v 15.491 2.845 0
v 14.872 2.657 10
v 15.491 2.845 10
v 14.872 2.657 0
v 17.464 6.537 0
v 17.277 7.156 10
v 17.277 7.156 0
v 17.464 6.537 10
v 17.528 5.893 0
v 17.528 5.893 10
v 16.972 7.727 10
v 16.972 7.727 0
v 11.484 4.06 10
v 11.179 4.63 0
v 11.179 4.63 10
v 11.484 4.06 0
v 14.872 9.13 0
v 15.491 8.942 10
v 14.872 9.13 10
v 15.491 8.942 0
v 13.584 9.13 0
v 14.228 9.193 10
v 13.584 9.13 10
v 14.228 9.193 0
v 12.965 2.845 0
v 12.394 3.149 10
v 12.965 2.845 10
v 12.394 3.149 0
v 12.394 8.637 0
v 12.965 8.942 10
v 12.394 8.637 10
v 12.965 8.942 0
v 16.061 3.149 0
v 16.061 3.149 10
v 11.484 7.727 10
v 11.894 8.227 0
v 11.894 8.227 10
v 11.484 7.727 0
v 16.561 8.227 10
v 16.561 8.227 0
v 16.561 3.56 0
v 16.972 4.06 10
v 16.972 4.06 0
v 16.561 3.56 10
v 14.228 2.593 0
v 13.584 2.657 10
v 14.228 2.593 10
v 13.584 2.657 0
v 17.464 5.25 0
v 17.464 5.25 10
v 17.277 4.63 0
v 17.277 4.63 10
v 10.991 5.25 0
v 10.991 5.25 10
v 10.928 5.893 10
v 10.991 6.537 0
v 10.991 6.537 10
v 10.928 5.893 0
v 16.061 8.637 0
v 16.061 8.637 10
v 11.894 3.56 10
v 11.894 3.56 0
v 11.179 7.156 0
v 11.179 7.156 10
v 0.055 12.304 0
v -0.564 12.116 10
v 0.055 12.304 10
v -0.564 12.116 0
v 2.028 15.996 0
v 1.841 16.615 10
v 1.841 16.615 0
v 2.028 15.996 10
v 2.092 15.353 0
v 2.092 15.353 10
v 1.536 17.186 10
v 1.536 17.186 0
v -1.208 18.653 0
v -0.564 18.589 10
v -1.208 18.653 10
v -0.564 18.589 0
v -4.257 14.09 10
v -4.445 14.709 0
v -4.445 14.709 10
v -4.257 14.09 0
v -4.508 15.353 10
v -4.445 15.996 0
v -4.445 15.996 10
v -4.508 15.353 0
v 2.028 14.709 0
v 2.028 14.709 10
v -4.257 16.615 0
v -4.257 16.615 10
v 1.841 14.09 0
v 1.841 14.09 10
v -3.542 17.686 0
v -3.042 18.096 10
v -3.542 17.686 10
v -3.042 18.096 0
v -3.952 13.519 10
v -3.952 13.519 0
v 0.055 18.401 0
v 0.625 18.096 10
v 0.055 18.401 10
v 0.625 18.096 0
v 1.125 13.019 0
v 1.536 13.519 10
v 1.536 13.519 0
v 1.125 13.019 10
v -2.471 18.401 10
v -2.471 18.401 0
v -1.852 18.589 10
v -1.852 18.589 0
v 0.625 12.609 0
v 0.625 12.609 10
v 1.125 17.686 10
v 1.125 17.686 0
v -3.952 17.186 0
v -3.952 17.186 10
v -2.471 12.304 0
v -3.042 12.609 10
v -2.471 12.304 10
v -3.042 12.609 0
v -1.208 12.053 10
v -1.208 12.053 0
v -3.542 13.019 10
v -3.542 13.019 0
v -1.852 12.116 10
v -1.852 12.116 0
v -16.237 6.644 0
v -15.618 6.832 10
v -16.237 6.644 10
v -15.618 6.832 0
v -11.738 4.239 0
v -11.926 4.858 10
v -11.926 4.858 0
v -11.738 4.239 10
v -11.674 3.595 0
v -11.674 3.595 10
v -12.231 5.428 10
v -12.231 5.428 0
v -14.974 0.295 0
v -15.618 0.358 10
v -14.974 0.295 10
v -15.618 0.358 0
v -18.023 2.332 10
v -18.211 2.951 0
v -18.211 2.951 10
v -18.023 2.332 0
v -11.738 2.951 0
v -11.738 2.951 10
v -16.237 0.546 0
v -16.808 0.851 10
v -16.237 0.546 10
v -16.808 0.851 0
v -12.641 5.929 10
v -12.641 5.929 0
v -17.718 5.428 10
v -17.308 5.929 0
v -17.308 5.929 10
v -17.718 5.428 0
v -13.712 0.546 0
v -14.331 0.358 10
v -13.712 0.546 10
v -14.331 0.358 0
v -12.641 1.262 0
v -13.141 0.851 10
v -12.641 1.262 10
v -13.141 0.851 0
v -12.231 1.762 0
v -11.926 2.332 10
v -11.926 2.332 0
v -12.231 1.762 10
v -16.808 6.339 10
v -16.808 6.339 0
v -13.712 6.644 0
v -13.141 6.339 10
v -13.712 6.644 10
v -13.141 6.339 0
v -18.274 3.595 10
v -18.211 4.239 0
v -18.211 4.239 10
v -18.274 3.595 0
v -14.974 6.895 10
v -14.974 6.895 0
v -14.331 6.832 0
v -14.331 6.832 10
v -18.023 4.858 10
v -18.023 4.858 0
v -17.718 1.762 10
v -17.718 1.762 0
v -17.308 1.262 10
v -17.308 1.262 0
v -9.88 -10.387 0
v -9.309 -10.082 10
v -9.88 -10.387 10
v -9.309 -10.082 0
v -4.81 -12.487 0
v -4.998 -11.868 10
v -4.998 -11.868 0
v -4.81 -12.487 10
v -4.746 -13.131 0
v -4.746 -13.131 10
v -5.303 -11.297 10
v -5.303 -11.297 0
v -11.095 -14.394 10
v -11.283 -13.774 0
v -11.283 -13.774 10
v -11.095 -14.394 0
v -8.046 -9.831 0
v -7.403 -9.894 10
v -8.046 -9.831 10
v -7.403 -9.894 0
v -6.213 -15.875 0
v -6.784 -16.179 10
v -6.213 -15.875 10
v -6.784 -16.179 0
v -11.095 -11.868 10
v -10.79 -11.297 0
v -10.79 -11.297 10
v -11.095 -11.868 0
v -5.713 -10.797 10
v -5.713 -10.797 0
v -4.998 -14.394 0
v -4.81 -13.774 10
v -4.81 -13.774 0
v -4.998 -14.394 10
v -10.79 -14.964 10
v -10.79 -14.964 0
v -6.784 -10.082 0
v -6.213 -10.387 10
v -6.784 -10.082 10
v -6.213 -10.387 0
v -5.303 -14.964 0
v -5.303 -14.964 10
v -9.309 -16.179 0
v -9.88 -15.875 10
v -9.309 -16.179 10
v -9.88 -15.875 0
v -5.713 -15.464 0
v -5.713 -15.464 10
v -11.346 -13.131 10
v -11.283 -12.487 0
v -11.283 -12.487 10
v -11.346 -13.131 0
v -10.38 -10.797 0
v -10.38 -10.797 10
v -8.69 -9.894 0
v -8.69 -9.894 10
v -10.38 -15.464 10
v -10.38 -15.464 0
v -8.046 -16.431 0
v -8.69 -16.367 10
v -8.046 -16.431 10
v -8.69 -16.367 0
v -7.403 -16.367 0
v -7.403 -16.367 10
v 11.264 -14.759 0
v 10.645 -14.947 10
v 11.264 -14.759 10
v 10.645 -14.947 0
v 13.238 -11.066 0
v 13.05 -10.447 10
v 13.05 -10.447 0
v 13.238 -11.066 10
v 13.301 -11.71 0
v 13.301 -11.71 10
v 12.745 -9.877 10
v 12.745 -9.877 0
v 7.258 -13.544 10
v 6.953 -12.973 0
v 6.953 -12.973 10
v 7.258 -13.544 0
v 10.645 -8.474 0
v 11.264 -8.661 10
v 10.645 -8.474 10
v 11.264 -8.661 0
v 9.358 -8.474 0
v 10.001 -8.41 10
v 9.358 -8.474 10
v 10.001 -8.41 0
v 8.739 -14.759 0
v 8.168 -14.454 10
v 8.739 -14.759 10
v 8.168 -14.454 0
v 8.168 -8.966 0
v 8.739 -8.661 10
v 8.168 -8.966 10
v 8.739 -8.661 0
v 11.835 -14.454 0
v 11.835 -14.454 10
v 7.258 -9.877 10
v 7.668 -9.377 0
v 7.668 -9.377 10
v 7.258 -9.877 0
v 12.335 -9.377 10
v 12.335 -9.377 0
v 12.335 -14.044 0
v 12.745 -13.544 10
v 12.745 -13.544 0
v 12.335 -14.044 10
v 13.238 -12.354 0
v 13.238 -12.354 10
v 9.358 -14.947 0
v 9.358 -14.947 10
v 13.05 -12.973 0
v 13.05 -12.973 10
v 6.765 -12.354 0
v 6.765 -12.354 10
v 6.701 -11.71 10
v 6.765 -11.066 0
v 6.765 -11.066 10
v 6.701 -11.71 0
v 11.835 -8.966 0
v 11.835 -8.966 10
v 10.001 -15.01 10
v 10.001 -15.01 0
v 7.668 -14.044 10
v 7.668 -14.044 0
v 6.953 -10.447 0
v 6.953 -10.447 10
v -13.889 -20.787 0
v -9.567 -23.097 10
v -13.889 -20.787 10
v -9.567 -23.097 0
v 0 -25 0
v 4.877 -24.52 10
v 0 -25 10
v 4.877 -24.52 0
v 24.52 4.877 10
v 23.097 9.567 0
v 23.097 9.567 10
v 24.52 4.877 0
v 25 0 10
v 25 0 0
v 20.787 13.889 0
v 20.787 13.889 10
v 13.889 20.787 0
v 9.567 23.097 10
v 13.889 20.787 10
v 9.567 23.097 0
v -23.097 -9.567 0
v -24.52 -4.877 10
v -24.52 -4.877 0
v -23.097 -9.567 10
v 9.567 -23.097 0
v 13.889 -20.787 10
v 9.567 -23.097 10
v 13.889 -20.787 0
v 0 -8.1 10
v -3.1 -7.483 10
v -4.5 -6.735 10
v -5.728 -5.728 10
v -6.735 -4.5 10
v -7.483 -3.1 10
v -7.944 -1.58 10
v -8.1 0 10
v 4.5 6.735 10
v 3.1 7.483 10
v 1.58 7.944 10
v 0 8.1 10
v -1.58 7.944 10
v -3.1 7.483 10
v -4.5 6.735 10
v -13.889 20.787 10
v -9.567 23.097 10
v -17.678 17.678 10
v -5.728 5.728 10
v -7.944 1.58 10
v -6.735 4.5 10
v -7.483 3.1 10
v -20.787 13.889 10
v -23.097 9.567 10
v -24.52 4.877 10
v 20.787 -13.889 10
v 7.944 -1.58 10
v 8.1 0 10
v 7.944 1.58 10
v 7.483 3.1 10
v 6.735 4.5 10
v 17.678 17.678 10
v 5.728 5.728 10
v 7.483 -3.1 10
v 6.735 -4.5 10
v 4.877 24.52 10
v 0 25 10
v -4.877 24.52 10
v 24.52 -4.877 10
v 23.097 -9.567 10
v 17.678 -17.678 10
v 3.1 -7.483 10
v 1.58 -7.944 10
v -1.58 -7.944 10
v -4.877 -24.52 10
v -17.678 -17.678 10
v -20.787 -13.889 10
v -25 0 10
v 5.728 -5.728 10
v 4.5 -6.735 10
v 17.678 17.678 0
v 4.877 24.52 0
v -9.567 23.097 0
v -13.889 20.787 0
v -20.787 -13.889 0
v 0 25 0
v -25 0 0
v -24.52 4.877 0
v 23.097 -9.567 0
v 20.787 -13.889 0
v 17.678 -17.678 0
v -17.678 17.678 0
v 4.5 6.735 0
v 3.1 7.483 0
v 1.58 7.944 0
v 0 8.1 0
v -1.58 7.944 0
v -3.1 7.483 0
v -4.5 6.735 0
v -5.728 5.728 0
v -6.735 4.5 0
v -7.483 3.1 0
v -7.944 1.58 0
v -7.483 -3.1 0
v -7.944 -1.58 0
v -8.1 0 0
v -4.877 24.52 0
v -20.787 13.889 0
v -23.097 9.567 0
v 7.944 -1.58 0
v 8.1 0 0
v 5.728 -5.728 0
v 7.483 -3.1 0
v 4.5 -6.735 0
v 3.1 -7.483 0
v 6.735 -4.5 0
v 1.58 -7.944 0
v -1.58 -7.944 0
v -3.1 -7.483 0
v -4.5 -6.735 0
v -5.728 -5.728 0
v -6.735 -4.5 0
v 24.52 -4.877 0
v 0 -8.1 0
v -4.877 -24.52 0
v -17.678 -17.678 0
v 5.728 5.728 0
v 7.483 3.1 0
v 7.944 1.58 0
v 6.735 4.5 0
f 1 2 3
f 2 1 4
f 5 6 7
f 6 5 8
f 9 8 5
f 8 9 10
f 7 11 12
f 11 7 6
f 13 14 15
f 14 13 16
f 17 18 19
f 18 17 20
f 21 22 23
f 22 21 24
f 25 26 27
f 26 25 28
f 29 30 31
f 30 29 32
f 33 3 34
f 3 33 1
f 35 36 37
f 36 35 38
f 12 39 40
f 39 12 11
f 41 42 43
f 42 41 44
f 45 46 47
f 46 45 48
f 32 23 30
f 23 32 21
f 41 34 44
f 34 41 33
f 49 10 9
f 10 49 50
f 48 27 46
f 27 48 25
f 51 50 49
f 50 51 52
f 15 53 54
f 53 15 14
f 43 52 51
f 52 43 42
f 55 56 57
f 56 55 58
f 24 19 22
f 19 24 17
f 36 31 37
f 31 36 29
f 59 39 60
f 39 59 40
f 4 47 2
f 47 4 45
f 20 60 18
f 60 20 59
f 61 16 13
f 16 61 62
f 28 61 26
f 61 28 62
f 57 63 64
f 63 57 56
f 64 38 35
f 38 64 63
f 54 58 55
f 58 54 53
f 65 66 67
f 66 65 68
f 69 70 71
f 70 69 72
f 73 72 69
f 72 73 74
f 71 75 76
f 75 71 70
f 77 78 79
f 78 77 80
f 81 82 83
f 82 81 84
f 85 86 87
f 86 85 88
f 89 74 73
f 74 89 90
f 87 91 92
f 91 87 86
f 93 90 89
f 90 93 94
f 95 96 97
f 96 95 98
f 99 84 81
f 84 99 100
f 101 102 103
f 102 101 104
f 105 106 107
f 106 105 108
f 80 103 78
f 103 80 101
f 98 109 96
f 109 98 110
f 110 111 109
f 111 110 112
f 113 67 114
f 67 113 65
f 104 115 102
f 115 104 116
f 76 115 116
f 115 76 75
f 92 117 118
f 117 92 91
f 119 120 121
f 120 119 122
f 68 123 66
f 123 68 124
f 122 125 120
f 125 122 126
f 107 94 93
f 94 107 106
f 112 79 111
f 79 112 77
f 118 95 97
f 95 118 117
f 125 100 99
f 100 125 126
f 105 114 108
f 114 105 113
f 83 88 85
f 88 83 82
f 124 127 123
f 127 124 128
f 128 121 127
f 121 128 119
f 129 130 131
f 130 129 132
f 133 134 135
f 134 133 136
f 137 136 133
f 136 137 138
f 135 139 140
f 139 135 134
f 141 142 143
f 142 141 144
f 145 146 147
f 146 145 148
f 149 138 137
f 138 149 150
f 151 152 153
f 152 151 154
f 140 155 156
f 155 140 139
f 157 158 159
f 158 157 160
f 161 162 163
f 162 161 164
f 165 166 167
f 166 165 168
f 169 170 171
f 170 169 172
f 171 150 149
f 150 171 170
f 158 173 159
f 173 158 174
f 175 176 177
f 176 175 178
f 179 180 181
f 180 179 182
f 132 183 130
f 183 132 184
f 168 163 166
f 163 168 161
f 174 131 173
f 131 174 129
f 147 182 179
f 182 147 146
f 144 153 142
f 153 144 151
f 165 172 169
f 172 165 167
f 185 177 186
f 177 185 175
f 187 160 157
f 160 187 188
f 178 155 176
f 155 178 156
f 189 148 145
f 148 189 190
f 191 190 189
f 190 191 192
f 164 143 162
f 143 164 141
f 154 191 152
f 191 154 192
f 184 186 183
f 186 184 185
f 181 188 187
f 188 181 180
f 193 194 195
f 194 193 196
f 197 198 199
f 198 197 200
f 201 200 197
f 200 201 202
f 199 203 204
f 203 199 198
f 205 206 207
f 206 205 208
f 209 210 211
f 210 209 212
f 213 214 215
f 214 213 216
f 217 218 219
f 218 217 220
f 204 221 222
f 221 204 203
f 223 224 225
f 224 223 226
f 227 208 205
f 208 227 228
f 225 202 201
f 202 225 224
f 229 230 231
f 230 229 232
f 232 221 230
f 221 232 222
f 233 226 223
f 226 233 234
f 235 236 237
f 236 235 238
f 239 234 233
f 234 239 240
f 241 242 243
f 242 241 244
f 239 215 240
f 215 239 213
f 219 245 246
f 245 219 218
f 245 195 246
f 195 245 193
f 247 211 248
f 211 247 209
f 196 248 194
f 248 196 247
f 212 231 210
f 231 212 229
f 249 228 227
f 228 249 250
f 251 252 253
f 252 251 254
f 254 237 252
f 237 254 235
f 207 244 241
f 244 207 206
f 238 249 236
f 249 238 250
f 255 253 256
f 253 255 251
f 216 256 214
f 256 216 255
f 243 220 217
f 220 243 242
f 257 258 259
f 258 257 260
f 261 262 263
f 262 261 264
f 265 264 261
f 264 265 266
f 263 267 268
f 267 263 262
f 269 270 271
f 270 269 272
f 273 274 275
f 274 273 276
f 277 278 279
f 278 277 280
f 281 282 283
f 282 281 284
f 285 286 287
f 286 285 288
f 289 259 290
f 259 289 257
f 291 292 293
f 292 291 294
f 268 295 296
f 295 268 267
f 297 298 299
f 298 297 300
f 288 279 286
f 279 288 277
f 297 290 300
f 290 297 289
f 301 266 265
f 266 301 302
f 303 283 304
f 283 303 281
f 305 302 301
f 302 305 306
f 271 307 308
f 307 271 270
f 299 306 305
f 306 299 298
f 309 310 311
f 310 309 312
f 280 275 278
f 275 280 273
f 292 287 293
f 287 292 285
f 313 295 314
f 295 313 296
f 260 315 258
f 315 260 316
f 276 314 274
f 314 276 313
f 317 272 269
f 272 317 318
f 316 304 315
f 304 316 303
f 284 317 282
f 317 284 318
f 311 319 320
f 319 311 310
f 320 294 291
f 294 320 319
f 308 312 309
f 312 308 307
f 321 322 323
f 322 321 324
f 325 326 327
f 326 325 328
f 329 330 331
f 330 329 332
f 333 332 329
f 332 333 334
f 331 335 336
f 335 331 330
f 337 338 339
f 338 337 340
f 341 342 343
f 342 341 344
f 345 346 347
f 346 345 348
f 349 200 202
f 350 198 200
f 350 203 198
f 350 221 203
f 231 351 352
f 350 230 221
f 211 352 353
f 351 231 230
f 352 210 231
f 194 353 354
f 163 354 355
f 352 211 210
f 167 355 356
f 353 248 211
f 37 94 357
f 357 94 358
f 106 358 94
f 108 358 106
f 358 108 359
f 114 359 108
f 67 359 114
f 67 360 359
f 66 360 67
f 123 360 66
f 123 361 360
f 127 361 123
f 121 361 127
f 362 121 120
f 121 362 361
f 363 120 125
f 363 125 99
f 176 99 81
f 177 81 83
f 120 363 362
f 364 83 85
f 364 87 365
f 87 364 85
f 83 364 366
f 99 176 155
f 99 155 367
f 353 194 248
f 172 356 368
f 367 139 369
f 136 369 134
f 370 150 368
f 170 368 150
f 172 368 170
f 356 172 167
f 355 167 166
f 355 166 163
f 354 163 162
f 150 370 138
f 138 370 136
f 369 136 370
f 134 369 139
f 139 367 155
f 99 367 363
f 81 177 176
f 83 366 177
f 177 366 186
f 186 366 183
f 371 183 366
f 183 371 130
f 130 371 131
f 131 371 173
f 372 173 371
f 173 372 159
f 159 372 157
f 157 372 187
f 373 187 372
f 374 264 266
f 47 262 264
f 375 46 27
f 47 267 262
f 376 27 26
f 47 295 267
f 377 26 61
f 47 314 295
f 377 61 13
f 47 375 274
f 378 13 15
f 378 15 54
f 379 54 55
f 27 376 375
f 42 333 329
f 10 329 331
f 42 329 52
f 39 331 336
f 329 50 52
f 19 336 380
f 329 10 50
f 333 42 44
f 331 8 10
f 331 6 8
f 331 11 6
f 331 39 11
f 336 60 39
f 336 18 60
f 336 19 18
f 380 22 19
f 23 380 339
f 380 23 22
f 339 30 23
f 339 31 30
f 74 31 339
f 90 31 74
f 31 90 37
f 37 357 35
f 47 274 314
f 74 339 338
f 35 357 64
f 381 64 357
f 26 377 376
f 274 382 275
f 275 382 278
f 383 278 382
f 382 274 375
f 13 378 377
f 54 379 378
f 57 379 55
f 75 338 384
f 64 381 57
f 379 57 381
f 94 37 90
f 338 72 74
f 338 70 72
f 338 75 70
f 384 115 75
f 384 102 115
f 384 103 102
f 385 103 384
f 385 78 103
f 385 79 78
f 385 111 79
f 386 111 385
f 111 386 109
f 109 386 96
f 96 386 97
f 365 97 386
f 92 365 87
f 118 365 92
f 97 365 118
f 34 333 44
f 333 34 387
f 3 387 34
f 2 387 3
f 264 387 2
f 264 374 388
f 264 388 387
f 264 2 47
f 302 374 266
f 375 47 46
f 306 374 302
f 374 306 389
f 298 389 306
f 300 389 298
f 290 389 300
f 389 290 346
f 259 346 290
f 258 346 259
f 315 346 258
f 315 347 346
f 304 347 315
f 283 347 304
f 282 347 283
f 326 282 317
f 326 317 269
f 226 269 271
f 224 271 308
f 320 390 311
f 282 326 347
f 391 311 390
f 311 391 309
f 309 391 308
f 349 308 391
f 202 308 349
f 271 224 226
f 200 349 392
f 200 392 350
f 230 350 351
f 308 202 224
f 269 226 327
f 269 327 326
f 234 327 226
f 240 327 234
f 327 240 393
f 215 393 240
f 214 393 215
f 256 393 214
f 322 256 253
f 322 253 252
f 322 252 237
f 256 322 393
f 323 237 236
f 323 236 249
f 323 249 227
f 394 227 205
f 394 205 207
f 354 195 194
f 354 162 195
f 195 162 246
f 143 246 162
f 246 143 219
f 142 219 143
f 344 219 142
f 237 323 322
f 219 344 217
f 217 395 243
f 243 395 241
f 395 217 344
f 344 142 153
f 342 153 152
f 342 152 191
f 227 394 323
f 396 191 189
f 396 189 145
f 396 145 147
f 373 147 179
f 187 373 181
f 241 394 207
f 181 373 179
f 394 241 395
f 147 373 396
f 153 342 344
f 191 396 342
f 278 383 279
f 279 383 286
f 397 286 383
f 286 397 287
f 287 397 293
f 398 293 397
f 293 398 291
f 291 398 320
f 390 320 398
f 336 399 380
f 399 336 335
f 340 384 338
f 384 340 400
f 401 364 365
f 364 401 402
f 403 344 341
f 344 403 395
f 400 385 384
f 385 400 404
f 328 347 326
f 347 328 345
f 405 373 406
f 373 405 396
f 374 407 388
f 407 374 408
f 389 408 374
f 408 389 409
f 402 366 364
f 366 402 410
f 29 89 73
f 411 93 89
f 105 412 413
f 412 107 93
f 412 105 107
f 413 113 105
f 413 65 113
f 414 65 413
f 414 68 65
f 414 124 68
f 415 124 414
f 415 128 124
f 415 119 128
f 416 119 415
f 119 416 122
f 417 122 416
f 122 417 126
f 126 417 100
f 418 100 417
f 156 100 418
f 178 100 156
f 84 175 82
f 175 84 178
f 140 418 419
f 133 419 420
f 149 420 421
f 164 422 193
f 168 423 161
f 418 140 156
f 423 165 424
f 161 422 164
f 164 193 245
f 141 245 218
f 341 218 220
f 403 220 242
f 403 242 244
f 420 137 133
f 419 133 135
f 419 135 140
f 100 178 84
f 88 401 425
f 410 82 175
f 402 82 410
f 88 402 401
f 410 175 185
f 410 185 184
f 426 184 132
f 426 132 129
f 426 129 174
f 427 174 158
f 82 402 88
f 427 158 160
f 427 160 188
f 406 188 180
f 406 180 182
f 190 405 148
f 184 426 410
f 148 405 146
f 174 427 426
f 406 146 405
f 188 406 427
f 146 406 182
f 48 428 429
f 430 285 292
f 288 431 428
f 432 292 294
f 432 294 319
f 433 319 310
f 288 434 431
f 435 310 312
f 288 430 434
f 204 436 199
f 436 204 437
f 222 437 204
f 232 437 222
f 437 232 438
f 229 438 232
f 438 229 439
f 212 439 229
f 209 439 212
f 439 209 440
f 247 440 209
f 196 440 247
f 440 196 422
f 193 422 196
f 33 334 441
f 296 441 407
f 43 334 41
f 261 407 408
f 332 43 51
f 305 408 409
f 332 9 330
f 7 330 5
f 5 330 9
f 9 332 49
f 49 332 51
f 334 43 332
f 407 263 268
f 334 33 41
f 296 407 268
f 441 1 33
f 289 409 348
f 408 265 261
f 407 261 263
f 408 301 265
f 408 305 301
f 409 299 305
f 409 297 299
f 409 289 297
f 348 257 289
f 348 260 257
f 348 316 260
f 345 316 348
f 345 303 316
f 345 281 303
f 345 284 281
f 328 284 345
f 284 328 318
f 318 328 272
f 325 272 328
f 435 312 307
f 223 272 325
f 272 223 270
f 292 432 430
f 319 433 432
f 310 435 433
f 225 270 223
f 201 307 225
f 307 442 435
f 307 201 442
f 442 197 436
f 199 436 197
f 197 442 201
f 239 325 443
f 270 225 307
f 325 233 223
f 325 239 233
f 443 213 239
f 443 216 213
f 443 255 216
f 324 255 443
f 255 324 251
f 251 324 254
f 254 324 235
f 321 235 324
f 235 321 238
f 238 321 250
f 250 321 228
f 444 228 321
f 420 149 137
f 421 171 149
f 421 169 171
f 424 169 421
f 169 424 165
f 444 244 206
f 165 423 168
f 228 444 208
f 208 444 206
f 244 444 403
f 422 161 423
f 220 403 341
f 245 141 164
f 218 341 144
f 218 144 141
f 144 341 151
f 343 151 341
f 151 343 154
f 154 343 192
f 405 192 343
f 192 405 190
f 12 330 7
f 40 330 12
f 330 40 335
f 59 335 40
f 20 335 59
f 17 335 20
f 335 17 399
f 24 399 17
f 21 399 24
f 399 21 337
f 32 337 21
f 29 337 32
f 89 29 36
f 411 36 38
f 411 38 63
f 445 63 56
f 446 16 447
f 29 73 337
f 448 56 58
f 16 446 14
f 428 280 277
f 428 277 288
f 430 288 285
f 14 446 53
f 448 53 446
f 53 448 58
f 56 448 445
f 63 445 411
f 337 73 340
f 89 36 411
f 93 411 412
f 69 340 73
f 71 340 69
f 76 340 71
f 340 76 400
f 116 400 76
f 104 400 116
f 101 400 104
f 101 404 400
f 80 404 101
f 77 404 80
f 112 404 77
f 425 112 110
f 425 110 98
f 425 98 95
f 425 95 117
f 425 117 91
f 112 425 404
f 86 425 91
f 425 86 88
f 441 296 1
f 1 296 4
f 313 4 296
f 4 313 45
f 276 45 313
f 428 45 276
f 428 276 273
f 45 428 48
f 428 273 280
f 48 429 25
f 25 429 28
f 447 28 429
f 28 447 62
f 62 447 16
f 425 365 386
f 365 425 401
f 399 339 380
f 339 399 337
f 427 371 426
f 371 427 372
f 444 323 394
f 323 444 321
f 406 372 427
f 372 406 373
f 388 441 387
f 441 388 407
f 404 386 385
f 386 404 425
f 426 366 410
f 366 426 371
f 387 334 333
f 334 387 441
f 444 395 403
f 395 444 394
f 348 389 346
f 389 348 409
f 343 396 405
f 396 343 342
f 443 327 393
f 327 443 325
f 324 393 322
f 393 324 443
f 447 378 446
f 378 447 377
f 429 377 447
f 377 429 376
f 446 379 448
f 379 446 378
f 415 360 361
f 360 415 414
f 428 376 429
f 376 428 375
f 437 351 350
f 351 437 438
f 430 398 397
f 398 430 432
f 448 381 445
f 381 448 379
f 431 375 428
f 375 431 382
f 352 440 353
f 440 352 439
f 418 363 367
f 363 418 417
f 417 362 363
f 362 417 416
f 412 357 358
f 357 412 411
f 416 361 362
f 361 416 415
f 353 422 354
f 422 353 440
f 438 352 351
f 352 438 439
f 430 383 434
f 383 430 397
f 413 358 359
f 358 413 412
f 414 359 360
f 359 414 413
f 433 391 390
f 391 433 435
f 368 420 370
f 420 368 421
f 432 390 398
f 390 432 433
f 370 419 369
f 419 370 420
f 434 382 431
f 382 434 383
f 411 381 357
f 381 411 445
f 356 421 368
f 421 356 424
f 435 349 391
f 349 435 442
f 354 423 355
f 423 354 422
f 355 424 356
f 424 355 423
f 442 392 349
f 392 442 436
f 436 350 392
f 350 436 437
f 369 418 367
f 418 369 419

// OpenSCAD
$fn = 32;

// ----------------------------------------------------------------------
// Flange Ø50 x 10
// 5 holes on a Ø30.8 bolt circle, bolted joints
// ----------------------------------------------------------------------

// --- parameters (mm) ---
flange_d = 50;     // outside diameter of the flange
thickness = 10;    // flange thickness
holes = 5;         // number of bolt holes
pcd = 30.8;        // bolt circle diameter
start_deg = 22.5;  // angle of the first hole, from +X
hole_d = 6.6;      // bolt hole diameter
bore_d = 16.2;     // central through bore
hub_d = 26.2;      // hub outside diameter
hub_h = 0;         // hub height above the flange face (0 = no hub)

// --- derived feature positions (mm) ---
height = thickness + hub_h;  // = 10   overall height of the part
pcd_r = pcd / 2;             // = 15.4   bolt circle radius
hole_step = 360 / holes;     // = 72   angular pitch
feature_centers = [
  [pcd_r * cos(start_deg + 0 * hole_step), pcd_r * sin(start_deg + 0 * hole_step)],
  [pcd_r * cos(start_deg + 1 * hole_step), pcd_r * sin(start_deg + 1 * hole_step)],
  [pcd_r * cos(start_deg + 2 * hole_step), pcd_r * sin(start_deg + 2 * hole_step)],
  [pcd_r * cos(start_deg + 3 * hole_step), pcd_r * sin(start_deg + 3 * hole_step)],
  [pcd_r * cos(start_deg + 4 * hole_step), pcd_r * sin(start_deg + 4 * hole_step)]
];   // bolt hole centres on the pitch circle

// flange disc, every hole and the bore cut straight through
difference() {
  union() {
    cylinder(d = flange_d, h = thickness);
  }
  translate([0, 0, -1]) cylinder(d = bore_d, h = height + 2);  // bore, through
  for (centre = feature_centers)
    translate([centre[0], centre[1], -1]) cylinder(d = hole_d, h = thickness + 2);
}
